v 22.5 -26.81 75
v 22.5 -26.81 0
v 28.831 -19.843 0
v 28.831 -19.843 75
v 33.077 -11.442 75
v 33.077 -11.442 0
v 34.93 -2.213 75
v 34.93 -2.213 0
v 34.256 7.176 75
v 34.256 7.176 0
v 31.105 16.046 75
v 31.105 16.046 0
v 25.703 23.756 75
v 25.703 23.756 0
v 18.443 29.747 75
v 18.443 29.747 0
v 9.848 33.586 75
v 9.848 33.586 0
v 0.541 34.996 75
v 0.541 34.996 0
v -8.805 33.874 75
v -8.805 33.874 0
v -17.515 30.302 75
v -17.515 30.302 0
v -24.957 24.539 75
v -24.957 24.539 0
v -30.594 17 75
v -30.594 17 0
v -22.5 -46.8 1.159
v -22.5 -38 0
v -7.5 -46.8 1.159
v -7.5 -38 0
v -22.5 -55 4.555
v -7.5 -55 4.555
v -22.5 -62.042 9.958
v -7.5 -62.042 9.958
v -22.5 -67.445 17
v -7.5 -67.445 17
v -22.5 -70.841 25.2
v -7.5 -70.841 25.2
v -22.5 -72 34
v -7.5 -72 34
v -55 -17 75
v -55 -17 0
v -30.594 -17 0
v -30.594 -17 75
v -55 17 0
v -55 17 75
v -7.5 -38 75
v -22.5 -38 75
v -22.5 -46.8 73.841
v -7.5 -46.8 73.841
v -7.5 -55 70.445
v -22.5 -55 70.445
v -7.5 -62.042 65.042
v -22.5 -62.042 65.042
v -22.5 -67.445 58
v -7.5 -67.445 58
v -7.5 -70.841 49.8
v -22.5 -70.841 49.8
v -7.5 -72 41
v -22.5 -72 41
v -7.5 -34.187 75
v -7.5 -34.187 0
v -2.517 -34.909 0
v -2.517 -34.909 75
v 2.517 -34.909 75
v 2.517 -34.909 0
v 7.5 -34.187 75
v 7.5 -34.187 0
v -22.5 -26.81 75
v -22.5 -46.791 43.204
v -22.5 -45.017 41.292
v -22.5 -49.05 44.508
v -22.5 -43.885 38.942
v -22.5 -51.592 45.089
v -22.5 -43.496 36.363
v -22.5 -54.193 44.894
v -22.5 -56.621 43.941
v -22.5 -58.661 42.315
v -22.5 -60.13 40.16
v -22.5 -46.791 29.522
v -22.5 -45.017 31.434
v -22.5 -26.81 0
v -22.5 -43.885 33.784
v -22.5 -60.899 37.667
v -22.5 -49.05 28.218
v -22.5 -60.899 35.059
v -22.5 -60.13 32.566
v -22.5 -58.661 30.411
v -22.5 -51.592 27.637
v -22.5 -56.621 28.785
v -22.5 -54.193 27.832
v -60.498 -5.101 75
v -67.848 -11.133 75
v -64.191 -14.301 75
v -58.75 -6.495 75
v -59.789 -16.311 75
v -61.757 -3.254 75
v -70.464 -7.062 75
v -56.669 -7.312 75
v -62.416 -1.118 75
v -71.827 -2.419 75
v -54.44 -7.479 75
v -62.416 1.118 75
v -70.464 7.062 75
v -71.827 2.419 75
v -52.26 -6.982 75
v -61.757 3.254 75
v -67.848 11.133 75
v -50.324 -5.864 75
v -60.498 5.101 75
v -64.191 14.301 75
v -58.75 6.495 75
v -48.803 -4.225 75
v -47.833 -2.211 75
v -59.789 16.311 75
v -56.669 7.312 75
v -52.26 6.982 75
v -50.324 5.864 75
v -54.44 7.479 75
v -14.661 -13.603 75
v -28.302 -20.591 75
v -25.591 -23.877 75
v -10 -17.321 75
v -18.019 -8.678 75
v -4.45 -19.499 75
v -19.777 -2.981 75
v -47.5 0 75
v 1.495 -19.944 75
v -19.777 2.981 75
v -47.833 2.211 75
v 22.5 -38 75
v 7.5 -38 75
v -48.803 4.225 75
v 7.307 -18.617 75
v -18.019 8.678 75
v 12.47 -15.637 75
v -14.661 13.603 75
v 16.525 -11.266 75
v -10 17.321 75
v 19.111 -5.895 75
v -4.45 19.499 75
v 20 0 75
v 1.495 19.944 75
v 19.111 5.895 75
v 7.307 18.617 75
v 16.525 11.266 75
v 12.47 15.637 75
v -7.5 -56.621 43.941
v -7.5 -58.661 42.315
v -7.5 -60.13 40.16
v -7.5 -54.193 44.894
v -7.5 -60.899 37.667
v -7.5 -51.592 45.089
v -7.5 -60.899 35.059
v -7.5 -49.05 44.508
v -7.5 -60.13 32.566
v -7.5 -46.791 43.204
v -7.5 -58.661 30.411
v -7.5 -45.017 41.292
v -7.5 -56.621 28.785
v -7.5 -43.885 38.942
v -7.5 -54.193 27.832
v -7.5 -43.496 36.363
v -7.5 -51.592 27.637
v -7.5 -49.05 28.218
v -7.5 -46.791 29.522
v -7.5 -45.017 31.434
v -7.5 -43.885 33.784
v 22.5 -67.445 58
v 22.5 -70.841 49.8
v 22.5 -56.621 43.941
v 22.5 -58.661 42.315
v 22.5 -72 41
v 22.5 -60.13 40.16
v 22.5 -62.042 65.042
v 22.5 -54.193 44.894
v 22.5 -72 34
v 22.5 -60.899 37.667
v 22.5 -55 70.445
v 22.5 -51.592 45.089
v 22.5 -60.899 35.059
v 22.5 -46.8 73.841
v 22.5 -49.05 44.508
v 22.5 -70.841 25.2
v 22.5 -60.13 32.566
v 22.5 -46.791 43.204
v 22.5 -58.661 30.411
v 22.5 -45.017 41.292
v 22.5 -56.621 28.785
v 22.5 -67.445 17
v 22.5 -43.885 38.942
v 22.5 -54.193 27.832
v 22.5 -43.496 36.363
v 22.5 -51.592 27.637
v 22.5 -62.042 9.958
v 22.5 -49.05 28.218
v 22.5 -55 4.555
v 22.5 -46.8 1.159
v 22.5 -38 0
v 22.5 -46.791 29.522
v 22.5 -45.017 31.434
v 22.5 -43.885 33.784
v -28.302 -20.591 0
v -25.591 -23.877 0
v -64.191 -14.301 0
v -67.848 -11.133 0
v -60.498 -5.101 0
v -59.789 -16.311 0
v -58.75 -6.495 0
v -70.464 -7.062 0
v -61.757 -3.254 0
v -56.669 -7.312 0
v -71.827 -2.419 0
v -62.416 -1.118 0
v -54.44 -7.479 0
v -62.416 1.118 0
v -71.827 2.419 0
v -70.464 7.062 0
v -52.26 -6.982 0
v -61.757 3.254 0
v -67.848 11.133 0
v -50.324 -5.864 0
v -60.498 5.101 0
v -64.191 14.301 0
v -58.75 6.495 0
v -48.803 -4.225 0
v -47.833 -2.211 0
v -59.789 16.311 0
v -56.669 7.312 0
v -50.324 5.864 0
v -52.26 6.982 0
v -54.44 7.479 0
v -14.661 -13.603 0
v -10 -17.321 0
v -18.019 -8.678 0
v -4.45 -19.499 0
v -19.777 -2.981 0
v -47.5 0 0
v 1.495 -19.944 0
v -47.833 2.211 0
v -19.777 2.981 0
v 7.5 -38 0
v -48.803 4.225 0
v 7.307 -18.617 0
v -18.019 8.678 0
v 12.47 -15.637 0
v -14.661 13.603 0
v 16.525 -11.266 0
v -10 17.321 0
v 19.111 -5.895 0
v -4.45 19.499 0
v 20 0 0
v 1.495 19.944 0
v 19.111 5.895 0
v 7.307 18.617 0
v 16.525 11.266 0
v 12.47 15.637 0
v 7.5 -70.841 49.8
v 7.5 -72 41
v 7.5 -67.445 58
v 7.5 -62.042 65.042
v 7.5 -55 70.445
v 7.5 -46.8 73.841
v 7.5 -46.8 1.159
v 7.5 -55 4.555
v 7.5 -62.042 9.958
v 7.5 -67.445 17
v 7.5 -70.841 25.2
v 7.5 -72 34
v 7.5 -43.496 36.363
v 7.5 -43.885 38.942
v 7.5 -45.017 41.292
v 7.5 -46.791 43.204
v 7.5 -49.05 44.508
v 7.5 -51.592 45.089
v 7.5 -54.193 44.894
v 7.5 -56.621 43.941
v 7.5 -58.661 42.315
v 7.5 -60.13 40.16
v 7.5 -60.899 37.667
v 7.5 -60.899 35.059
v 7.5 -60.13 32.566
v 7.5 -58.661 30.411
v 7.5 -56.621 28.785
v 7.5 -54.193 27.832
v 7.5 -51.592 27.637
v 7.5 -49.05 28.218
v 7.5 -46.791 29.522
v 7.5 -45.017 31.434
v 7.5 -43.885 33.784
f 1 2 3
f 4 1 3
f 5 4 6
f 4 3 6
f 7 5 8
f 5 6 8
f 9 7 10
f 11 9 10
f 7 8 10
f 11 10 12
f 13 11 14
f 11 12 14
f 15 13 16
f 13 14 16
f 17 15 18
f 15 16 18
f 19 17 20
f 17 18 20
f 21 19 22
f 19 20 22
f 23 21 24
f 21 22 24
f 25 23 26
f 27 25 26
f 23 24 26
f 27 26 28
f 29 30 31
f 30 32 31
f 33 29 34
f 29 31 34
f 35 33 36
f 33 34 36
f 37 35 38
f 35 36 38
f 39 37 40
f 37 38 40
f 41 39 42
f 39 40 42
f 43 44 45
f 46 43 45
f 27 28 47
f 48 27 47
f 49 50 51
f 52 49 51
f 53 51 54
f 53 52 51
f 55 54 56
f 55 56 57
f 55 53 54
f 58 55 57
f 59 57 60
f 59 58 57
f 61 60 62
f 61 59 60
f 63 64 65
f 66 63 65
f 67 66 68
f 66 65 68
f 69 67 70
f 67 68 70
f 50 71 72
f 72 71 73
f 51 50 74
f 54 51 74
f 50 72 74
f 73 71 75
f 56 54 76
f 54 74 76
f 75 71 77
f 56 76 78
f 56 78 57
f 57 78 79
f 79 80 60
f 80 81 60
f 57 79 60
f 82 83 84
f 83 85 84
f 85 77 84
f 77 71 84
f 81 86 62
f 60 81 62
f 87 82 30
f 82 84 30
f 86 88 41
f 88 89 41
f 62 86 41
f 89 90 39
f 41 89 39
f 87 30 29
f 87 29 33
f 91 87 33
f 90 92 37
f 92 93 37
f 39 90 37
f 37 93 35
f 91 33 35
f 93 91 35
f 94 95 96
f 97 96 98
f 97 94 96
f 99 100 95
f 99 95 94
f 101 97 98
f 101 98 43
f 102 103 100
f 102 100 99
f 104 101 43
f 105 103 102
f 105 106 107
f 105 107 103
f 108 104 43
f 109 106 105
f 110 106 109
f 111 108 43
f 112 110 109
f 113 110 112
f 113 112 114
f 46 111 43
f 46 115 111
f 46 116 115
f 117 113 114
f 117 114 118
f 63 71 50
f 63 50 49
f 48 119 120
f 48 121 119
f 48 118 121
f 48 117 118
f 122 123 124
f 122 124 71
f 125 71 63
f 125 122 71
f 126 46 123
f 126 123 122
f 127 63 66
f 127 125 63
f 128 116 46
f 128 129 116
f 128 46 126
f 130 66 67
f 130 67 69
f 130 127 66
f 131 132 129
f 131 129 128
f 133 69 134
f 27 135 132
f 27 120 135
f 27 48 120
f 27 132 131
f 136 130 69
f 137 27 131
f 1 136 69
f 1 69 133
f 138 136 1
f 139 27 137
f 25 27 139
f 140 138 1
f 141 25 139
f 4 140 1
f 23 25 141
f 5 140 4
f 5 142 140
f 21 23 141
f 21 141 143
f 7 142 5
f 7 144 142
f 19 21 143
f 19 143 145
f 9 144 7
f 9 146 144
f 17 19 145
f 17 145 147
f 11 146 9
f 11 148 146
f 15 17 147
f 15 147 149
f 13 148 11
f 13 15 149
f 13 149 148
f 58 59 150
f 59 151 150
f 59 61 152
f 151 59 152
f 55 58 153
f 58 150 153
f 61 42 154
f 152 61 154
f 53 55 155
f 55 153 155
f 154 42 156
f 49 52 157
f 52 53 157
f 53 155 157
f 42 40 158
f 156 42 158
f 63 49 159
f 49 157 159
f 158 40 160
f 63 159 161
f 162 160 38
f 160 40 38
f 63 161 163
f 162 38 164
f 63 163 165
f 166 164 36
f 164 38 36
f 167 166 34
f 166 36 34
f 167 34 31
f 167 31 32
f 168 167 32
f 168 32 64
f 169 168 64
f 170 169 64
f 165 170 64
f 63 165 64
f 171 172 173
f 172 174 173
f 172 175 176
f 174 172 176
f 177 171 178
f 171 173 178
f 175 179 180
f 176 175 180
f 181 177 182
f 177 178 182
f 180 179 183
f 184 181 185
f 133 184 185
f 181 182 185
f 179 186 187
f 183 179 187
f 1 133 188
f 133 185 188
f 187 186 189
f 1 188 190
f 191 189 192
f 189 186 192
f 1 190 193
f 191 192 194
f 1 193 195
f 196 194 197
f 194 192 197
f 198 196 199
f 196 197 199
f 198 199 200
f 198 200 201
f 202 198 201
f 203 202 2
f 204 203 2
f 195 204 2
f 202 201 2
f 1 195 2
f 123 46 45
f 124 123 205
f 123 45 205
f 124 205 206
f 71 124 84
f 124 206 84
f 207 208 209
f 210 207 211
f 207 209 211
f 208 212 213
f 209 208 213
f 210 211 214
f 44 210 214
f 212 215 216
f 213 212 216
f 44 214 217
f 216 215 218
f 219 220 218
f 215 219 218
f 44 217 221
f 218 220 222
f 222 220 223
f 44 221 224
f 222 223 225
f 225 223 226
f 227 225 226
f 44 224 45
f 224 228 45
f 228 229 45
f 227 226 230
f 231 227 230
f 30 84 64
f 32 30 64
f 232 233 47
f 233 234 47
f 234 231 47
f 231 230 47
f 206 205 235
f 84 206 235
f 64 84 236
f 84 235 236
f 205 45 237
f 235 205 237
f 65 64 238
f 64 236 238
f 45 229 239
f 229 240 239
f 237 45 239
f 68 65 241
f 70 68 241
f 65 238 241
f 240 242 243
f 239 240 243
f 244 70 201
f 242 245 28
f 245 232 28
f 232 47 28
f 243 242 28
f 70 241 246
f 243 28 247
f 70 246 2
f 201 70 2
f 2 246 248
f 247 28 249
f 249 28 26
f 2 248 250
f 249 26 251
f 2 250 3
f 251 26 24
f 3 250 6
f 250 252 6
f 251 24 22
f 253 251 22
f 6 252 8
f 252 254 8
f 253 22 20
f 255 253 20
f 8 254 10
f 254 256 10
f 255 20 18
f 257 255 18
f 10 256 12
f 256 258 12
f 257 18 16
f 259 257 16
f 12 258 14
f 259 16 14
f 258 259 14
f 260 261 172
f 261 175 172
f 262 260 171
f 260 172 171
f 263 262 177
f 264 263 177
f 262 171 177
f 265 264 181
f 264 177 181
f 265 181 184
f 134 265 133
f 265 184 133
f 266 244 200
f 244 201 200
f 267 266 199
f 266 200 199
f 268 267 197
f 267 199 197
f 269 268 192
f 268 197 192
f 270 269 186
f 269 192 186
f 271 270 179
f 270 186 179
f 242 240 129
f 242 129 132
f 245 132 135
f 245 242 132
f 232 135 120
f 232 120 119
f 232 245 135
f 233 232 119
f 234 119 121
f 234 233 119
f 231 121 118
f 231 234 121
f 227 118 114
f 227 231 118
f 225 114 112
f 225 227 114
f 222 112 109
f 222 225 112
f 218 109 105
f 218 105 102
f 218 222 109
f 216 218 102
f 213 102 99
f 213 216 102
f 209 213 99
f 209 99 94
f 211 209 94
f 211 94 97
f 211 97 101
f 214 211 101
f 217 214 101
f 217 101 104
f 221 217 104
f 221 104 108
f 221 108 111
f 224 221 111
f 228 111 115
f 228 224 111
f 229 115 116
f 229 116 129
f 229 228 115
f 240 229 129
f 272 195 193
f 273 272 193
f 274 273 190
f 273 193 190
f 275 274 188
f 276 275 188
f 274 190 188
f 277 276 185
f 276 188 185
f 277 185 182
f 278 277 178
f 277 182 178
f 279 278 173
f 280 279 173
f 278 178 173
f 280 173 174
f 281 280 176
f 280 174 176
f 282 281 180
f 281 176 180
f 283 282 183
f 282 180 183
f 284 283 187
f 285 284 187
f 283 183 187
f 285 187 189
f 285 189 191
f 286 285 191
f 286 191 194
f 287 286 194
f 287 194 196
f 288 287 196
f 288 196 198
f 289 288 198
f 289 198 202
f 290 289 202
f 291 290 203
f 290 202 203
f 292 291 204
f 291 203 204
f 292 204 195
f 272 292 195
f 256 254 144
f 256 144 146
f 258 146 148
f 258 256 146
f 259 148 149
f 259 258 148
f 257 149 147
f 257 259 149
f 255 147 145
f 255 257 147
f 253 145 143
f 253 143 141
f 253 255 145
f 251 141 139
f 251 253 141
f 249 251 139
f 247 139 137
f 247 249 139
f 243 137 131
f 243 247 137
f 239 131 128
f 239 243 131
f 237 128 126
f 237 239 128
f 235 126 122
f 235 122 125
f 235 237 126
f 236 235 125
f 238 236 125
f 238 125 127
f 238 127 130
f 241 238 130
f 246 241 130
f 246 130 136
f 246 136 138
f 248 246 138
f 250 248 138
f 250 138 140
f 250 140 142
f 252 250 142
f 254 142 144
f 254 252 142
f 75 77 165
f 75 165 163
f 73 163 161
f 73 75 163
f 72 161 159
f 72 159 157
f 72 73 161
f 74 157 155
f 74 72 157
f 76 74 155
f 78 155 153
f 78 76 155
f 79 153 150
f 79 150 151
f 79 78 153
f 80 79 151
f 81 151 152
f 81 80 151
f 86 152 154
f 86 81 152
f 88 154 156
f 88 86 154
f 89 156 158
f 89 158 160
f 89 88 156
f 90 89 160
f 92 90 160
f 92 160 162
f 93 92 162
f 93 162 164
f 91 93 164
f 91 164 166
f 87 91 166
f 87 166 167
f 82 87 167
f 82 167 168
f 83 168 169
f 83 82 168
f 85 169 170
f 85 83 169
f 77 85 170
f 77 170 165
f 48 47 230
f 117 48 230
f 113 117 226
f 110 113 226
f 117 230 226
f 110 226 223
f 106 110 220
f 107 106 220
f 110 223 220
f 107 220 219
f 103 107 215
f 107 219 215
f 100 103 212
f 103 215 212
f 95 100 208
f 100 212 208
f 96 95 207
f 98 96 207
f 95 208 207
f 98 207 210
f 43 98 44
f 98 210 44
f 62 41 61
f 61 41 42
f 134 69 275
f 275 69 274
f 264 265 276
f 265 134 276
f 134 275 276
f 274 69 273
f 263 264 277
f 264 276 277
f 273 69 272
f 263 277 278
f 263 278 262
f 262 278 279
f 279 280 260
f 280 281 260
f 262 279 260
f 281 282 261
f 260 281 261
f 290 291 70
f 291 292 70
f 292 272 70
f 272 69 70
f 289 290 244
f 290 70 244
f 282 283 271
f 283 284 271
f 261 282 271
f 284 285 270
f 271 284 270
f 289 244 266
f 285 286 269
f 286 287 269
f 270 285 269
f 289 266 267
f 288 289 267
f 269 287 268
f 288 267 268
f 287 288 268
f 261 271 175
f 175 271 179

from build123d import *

# Parameters (mm, degrees)
SKETCH1_R           = 7.5
SKETCH1_R_2         = 20
BOSS_EXTRUDE1_DEPTH = 75
BOSS_EXTRUDE2_DEPTH = 75
FILLET6_R           = 34
FILLET8_R           = 34
SKETCH3_R           = 8.750256672
CUT_EXTRUDE1_DEPTH  = 15


with BuildPart() as part:
    # Sketch1 → Boss-Extrude1 (new body)
    with BuildSketch(Plane.XY):
        with BuildLine():
            Line((-55, -17), (-30.594117082, -17))
            ThreePointArc((-30.594117082, -17), (35, 0), (-30.594117082, 17))
            Line((-30.594117082, 17), (-55, 17))
            ThreePointArc((-55, 17), (-72, 0), (-55, -17))
        make_face()
        with Locations((-55, 0)):
            Circle(SKETCH1_R, mode=Mode.SUBTRACT)
        Circle(SKETCH1_R_2, mode=Mode.SUBTRACT)
    extrude(amount=BOSS_EXTRUDE1_DEPTH)

    # Sketch1<12> → Boss-Extrude2 (add)
    with BuildSketch(Plane.XY):
        with BuildLine():
            Line((22.5, -72), (22.5, -26.809513237))
            ThreePointArc((22.5, -26.809513237), (15.446901808, -31.406897722), (7.5, -34.186985828))
            Line((7.5, -34.186985828), (7.5, -72))
            Line((7.5, -72), (22.5, -72))
        make_face()
        with BuildLine():
            ThreePointArc((-7.5, -34.186985828), (-15.446901808, -31.406897722), (-22.5, -26.809513237))
            Line((-22.5, -26.809513237), (-22.5, -72))
            Line((-22.5, -72), (-7.5, -72))
            Line((-7.5, -72), (-7.5, -34.186985828))
        make_face()
    extrude(amount=BOSS_EXTRUDE2_DEPTH)

    # Fillet6
    fillet6_edges = [part.edges().sort_by_distance(p)[0] for p in [
        (-15, -72, 0),
        (-15, -72, 75),
    ]]
    fillet(fillet6_edges, radius=FILLET6_R)

    # Fillet8
    fillet8_edges = [part.edges().sort_by_distance(p)[0] for p in [
        (15, -72, 0),
        (15, -72, 75),
    ]]
    fillet(fillet8_edges, radius=FILLET8_R)

    # Sketch3 → Cut-Extrude1 (cut)
    with BuildSketch(Plane(origin=(22.5, 0, 0), x_dir=(0, 0, -1), z_dir=(1, 0, 0))):
        with Locations((-36.363077214, -52.246350357)):
            Circle(SKETCH3_R)
    cut_extrude1 = extrude(amount=-CUT_EXTRUDE1_DEPTH, mode=Mode.SUBTRACT)

    # Mirror2: Cut-Extrude1 across plane
    add(cut_extrude1.mirror(Plane(origin=(0, 0, 0), x_dir=(0, 0, 1), z_dir=(1, 0, 0))), mode=Mode.SUBTRACT)


solid = part.part
